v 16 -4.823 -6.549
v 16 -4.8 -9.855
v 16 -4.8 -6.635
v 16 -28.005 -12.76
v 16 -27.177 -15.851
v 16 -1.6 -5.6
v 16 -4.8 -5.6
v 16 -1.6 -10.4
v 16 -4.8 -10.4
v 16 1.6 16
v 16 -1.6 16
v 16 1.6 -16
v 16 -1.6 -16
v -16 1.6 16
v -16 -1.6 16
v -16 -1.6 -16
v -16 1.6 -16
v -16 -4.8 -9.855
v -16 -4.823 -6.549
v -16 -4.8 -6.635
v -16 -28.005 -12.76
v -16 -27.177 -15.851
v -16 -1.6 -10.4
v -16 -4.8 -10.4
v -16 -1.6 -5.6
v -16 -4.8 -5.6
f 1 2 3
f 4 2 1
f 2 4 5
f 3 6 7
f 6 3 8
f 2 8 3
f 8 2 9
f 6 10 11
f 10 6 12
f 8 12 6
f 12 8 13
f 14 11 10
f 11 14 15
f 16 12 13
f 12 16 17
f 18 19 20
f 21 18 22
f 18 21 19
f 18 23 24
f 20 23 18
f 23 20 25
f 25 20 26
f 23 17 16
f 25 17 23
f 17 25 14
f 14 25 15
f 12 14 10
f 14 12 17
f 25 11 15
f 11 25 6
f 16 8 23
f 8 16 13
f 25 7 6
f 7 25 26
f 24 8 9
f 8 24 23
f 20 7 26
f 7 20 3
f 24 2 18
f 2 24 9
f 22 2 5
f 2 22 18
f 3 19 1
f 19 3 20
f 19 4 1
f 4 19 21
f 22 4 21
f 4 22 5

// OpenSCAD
size=32; //block=32 //item=8



cube([size*1,size*0.1,size*1],center=true);	//base

translate([0,-size*0.1,-size*0.25]){	//connector
cube([size*1,size*0.1,size*0.15],center=true);
};	//translate


translate([0,-size*0.5,-size*0.35]){	//plough
rotate([15,0,0]){
cube([size*1,size*0.75,size*0.1],center=true);
};	//rotate
};	//translate
